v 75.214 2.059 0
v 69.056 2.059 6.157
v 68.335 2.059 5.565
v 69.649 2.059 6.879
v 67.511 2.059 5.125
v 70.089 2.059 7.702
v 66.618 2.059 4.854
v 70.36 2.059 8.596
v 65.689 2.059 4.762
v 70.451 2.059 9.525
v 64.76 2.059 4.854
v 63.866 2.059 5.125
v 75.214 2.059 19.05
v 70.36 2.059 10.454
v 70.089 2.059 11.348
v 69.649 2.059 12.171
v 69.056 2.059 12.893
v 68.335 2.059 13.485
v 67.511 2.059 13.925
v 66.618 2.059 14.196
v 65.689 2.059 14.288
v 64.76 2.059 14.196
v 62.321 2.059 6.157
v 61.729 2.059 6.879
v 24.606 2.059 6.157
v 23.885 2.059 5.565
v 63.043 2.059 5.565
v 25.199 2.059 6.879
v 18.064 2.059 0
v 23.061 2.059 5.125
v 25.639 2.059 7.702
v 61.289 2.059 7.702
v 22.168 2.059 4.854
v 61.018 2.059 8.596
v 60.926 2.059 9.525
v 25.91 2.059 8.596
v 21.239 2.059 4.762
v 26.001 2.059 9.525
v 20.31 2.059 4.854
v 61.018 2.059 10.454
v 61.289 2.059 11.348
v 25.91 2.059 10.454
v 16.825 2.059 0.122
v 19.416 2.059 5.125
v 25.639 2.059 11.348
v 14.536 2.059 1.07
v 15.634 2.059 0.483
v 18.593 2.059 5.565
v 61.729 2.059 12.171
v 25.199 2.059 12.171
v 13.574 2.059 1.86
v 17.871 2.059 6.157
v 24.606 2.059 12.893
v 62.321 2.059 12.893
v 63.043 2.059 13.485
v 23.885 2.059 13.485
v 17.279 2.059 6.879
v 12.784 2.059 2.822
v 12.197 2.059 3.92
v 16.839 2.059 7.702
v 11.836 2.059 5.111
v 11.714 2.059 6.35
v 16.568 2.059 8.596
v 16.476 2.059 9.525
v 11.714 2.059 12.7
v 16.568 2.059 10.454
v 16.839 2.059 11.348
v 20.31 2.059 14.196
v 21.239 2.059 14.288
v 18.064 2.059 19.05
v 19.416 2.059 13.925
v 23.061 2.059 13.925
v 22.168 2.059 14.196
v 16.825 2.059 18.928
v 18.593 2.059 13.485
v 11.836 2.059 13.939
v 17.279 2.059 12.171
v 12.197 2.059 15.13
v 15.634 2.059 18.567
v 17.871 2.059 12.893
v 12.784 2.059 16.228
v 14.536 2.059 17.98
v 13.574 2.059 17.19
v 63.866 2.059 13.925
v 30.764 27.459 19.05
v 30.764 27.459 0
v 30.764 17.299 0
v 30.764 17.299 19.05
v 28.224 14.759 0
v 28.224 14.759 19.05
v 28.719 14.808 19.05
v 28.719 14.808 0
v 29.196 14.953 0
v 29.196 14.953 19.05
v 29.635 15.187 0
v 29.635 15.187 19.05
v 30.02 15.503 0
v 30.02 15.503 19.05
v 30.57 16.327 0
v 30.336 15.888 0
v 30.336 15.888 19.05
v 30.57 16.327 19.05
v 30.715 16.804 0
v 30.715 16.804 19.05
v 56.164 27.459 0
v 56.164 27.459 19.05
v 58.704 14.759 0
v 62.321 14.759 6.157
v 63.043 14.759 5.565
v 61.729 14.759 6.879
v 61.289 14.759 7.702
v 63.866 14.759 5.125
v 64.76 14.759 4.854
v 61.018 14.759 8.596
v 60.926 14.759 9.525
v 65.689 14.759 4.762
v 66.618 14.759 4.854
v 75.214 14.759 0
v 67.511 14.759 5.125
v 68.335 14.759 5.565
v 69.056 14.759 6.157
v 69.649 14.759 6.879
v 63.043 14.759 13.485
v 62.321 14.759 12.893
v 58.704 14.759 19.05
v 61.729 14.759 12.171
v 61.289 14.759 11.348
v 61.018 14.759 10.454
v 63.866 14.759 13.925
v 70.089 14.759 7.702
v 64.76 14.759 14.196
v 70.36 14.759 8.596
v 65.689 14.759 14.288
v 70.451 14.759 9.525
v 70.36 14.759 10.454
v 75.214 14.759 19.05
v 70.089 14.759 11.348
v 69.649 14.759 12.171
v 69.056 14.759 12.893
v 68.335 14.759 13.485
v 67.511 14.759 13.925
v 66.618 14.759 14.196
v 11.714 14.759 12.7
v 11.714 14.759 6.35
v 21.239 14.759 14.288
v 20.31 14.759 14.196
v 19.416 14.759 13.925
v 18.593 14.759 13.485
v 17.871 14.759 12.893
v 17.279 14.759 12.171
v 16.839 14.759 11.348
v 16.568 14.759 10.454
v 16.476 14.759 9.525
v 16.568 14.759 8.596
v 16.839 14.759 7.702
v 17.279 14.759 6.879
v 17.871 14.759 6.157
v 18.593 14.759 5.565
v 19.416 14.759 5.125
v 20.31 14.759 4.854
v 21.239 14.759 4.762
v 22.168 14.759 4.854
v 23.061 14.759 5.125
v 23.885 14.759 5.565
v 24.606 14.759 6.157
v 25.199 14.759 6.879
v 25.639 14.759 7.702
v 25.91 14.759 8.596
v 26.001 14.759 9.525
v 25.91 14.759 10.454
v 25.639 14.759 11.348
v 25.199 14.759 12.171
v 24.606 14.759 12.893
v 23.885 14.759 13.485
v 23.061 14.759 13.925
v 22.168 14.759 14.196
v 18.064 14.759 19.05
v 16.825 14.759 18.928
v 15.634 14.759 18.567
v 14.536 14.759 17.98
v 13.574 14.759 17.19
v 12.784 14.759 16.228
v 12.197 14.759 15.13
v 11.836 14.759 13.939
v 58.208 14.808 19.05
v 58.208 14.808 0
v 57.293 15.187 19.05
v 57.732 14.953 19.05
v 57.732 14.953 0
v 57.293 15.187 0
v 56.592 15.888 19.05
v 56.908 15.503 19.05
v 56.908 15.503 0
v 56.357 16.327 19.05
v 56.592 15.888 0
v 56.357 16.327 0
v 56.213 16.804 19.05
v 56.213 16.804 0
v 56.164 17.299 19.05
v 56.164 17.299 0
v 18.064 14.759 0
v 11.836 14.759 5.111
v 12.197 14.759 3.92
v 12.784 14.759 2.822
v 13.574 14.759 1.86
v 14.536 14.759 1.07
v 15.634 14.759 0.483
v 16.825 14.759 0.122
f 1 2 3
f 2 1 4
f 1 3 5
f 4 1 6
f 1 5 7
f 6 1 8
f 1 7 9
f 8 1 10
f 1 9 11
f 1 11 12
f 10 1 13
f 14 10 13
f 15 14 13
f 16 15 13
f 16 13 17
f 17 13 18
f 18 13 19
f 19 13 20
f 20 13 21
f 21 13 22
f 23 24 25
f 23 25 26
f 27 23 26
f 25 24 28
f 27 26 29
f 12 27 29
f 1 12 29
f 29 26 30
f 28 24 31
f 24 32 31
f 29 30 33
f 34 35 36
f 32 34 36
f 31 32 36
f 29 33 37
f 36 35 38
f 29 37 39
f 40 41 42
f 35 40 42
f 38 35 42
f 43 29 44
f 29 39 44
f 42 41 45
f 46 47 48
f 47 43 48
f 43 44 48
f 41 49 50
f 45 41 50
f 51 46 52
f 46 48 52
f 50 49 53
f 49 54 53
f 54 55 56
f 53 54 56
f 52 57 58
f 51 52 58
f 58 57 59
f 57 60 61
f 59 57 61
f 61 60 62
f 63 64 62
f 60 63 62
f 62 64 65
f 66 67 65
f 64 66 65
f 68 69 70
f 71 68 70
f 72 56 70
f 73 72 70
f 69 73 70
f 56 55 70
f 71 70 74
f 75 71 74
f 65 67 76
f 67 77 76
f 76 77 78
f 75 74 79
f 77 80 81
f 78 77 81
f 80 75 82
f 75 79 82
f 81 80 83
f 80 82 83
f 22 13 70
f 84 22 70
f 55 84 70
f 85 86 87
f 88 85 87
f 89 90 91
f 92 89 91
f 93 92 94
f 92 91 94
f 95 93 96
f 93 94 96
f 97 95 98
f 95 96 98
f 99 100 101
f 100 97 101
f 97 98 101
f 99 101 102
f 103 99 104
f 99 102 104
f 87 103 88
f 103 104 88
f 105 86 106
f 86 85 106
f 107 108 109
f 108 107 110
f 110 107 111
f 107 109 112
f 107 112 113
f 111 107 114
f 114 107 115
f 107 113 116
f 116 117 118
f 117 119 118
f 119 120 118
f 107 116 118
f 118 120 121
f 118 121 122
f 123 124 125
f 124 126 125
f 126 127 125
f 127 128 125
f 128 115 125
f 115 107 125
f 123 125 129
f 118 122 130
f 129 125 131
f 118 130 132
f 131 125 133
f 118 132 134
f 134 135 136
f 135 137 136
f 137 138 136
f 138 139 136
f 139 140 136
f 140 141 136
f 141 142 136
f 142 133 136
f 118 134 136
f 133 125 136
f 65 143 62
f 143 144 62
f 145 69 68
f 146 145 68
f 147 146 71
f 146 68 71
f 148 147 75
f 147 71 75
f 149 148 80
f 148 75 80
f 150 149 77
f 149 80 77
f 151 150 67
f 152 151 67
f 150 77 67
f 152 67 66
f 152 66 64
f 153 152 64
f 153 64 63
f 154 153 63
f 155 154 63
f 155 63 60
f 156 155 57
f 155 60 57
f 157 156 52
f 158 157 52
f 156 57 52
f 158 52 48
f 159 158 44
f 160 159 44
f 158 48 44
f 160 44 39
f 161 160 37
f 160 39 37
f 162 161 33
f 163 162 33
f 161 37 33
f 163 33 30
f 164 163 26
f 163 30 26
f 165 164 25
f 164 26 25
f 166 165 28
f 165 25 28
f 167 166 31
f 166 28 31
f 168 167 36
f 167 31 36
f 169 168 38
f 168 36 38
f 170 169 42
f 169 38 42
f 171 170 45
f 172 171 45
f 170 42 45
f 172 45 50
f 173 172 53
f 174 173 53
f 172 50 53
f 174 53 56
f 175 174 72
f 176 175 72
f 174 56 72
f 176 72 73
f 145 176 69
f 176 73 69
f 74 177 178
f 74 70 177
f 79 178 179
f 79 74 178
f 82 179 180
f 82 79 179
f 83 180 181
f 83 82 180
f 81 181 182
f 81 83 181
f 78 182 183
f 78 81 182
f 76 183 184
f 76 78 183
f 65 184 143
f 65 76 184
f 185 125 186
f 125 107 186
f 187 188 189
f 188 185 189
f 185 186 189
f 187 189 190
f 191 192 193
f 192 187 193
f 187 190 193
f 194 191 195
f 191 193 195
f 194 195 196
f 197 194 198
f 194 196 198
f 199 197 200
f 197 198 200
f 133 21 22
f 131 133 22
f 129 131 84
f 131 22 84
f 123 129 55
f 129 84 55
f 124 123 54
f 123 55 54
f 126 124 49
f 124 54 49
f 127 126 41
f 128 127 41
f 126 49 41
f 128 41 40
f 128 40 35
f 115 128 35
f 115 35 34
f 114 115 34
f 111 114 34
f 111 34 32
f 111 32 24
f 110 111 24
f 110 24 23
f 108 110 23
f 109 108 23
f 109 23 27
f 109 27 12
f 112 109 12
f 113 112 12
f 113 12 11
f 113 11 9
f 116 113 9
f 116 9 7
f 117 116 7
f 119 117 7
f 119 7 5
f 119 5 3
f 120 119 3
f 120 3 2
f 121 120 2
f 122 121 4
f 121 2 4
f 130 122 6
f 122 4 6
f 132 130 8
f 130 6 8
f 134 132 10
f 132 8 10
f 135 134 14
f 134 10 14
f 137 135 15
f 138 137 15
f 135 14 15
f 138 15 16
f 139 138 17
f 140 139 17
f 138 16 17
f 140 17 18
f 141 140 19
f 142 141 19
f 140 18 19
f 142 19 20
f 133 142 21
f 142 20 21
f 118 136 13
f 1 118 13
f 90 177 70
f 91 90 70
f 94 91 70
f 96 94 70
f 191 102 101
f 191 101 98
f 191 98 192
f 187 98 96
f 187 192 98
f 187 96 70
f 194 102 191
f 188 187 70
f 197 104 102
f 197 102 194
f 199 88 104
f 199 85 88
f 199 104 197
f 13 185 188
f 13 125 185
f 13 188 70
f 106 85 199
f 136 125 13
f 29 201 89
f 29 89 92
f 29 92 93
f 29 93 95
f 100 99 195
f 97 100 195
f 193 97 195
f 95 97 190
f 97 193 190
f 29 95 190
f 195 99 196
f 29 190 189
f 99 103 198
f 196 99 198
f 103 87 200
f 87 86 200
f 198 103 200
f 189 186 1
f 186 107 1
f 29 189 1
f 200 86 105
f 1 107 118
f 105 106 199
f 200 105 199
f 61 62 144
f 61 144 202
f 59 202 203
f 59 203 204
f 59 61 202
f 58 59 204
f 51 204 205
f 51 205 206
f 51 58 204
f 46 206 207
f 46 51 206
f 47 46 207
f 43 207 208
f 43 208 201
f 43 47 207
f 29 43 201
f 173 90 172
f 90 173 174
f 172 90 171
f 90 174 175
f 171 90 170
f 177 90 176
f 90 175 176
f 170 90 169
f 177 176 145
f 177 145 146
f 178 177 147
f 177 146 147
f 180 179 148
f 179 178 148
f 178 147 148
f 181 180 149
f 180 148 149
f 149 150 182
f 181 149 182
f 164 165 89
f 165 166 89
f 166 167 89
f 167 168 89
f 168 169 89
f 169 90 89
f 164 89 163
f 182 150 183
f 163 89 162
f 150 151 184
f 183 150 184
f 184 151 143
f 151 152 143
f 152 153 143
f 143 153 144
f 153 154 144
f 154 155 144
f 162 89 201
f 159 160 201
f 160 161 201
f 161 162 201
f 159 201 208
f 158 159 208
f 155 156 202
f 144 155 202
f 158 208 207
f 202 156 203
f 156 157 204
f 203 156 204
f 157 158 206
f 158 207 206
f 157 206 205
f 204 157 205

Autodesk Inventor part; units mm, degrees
ref_plane "YZ Plane" through (0, 0, 0) normal (1, 0, 0) x (0, 1, 0)
ref_plane "XZ Plane" through (0, 0, 0) normal (0, 1, 0) x (-1, 0, 0)
ref_plane "XY Plane" through (0, 0, 0) normal (0, 0, 1) x (1, 0, 0)
sketch "Sketch1" plane through (0, 0, 0) normal (0, 0, 1) x (1, 0, 0)
  line L0 (43.4638, 27.4592) -> (30.7638, 27.4592)
  line L1 (30.7638, 27.4592) -> (30.7638, 14.7592)
  line L2 (43.4638, 14.7592) -> (43.4638, 27.4592)
  line L3 (30.7638, 14.7592) -> (11.7138, 14.7592)
  line L4 (11.7138, 14.7592) -> (11.7138, 2.0592)
  line L5 (11.7138, 2.0592) -> (43.4638, 2.0592)
  line L6 (43.4638, 2.0592) -> (43.4638, 14.7592)
  point P0 (0, 0)
  dimension "d1" = 12.7
  dimension "d2" = 31.75
  dimension "d3" = 12.7
extrude "Extrusion1" add sketch "Sketch1" along normal blind 19.05
fillet "Fillet1" radius 6.35 2 edges at (11.7138, 8.4092, 19.05) (11.7138, 8.4092, 0)
sketch "Sketch2" plane through (30.7638, 14.7592, 19.05) normal (0, 1, 0) x (1, 0, 0)
  circle A0 centre (-9.525, 9.525) radius 4.7625
  point P0 (-30.7638, 19.05)
  point P1 (-31.0867, 15.9672)
  dimension "d8" = 9.525
hole "Hole1" at (21.2388, 14.7592, 9.525) at (-0.3229, 14.7592, 3.0828) at (21.2388, 14.7592, 9.525) direction (0, -1, 0) diameter 9.525 depth 25.4 tip angle 118
sketch "Sketch4" plane through (0, 0, 19.05) normal (0, 0, 1) x (1, 0, 0)
  line L0 (75.2138, 14.7592) -> (75.2138, 2.0592)
  line L1 (75.2138, 2.0592) -> (43.4638, 2.0592)
  line L2 (43.4638, 2.0592) -> (43.4638, 27.4592)
  line L3 (43.4638, 27.4592) -> (56.1638, 27.4592)
  line L4 (56.1638, 27.4592) -> (56.1638, 14.7592)
  line L5 (56.1638, 14.7592) -> (75.2138, 14.7592)
  point P0 (0, 0)
  dimension "d16" = 31.75
  dimension "d17" = 12.7
extrude "Extrusion3" add sketch "Sketch4" against normal blind 19.05
sketch "Sketch6" plane through (56.1638, 14.7592, 19.05) normal (0, 1, 0) x (1, 0, 0)
  line L0 (-38.1, 19.05) -> (19.05, 19.05) projected
  point P0 (-56.1638, 19.05)
  point P1 (9.525, 9.525)
hole "Hole2" at (65.6888, 14.7592, 9.525) direction (0, -1, 0) diameter 9.525 end through all
fillet "Fillet4" radius 2.54 1 edges at (30.7638, 14.7592, 9.525)
fillet "Fillet5" radius 2.54 1 edges at (56.1638, 14.7592, 9.525)
properties part number "Mirror"
